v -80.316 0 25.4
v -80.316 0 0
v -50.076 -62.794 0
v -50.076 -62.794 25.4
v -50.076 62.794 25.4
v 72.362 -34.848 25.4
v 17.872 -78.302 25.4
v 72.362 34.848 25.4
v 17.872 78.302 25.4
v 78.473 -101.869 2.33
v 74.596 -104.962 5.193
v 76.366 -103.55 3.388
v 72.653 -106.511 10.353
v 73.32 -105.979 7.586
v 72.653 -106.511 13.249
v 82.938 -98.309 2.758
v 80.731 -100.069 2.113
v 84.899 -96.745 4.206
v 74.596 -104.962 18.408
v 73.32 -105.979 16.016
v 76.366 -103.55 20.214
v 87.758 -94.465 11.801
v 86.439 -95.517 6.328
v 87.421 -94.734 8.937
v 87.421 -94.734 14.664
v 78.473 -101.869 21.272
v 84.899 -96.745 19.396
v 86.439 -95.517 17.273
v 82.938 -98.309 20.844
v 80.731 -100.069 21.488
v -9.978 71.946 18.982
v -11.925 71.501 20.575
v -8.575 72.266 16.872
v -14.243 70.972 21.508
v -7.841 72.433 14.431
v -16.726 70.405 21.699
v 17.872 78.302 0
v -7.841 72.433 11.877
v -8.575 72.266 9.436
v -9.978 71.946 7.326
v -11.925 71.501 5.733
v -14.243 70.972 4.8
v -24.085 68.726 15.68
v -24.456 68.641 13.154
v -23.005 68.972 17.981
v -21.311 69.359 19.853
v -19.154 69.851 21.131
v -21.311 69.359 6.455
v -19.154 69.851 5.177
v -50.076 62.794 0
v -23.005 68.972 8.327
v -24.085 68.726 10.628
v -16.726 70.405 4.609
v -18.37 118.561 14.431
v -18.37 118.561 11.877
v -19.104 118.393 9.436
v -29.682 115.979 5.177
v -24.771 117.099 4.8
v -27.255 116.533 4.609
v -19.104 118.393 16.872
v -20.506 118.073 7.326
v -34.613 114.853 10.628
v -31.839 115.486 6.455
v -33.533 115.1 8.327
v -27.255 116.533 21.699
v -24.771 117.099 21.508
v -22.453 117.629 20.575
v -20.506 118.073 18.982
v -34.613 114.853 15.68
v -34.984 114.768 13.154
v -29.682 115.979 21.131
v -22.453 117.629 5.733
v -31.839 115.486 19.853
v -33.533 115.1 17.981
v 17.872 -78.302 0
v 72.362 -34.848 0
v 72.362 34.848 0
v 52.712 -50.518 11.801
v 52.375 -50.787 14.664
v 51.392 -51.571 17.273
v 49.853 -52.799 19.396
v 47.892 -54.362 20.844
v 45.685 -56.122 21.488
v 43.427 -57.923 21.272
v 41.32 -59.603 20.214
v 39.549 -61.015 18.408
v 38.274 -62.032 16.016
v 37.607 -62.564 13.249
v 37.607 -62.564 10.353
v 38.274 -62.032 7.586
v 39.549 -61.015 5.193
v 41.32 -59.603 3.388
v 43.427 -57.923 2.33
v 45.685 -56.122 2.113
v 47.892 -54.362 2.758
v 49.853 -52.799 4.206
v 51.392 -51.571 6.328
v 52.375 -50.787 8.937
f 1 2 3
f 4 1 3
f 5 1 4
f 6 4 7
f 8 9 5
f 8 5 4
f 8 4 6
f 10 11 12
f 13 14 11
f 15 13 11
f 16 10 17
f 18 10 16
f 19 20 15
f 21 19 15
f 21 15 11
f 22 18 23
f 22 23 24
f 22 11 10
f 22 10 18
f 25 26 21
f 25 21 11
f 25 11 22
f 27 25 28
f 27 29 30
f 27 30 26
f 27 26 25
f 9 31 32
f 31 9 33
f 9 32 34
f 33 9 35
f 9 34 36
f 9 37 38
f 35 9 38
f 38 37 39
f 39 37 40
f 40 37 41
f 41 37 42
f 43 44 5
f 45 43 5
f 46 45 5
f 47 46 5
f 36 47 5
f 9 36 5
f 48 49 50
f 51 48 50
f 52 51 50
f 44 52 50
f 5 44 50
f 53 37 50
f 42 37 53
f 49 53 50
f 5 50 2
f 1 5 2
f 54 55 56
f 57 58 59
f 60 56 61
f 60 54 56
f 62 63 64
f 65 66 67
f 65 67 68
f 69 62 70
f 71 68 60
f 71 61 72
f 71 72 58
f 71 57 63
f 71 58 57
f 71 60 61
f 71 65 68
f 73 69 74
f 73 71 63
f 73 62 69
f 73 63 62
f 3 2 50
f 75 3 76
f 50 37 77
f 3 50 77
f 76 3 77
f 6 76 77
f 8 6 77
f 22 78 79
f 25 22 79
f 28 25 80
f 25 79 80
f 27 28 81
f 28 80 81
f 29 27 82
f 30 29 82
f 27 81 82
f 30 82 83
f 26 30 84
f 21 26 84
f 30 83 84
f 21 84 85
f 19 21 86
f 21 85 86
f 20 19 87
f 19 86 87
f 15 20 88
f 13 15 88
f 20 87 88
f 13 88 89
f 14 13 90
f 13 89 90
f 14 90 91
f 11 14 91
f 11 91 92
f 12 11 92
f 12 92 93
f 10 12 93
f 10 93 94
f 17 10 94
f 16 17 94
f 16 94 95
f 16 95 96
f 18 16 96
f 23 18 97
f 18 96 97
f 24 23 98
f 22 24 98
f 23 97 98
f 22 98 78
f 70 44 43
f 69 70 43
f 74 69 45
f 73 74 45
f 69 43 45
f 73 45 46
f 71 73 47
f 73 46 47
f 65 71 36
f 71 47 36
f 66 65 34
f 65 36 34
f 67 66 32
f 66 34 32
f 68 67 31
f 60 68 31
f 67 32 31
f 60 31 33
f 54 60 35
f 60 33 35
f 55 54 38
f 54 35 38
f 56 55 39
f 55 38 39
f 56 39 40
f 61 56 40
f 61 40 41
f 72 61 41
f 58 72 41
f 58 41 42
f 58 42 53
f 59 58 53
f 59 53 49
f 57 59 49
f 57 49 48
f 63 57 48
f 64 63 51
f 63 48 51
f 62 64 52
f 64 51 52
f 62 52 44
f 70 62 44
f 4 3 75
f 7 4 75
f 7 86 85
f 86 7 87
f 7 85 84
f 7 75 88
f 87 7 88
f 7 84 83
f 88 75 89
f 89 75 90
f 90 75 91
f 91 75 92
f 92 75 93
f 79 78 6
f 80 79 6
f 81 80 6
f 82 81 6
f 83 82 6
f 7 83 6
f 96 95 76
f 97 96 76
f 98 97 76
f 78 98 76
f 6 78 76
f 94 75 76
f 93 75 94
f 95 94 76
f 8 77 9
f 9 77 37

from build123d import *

# Parameters (mm, degrees)
F1_DEPTH = 25.4
F2_R     = 9.7144872298
F3_DEPTH = 56.2097504735
F4_R     = 8.5689068518
F5_DEPTH = 47.313503921


with BuildPart() as f1:
    # F0 (on Top) → F1 (new body)
    with BuildSketch(Plane.XY):
        Polygon((72.3621845245, -34.8477914285), (72.3621845245, 34.8477914285), (17.871983658, 78.3022765744), (-50.076185425, 62.7935503844), (-80.315965515, 0), (-50.076185425, -62.7935503844), (17.871983658, -78.3022765744), align=None)
    extrude(amount=F1_DEPTH)

    # F2 (on face) → F3 (join)
    with BuildSketch(Plane(origin=(45.1170840913, -56.5750340014, 0), x_dir=(0.7818314825, 0.6234898019, 0), z_dir=(0.6234898019, -0.7818314825, 0))):
        with Locations((0, 11.8007967249)):
            Circle(F2_R)
    extrude(amount=F3_DEPTH)

    # F4 (on face) → F5 (join)
    with BuildSketch(Plane(origin=(-16.1021008835, 70.5479134794, 0), x_dir=(-0.9749279122, -0.222520934, 0), z_dir=(-0.222520934, 0.9749279122, 0))):
        with Locations((0, 13.1539618596)):
            Circle(F4_R)
    extrude(amount=F5_DEPTH)


solid = f1.part
